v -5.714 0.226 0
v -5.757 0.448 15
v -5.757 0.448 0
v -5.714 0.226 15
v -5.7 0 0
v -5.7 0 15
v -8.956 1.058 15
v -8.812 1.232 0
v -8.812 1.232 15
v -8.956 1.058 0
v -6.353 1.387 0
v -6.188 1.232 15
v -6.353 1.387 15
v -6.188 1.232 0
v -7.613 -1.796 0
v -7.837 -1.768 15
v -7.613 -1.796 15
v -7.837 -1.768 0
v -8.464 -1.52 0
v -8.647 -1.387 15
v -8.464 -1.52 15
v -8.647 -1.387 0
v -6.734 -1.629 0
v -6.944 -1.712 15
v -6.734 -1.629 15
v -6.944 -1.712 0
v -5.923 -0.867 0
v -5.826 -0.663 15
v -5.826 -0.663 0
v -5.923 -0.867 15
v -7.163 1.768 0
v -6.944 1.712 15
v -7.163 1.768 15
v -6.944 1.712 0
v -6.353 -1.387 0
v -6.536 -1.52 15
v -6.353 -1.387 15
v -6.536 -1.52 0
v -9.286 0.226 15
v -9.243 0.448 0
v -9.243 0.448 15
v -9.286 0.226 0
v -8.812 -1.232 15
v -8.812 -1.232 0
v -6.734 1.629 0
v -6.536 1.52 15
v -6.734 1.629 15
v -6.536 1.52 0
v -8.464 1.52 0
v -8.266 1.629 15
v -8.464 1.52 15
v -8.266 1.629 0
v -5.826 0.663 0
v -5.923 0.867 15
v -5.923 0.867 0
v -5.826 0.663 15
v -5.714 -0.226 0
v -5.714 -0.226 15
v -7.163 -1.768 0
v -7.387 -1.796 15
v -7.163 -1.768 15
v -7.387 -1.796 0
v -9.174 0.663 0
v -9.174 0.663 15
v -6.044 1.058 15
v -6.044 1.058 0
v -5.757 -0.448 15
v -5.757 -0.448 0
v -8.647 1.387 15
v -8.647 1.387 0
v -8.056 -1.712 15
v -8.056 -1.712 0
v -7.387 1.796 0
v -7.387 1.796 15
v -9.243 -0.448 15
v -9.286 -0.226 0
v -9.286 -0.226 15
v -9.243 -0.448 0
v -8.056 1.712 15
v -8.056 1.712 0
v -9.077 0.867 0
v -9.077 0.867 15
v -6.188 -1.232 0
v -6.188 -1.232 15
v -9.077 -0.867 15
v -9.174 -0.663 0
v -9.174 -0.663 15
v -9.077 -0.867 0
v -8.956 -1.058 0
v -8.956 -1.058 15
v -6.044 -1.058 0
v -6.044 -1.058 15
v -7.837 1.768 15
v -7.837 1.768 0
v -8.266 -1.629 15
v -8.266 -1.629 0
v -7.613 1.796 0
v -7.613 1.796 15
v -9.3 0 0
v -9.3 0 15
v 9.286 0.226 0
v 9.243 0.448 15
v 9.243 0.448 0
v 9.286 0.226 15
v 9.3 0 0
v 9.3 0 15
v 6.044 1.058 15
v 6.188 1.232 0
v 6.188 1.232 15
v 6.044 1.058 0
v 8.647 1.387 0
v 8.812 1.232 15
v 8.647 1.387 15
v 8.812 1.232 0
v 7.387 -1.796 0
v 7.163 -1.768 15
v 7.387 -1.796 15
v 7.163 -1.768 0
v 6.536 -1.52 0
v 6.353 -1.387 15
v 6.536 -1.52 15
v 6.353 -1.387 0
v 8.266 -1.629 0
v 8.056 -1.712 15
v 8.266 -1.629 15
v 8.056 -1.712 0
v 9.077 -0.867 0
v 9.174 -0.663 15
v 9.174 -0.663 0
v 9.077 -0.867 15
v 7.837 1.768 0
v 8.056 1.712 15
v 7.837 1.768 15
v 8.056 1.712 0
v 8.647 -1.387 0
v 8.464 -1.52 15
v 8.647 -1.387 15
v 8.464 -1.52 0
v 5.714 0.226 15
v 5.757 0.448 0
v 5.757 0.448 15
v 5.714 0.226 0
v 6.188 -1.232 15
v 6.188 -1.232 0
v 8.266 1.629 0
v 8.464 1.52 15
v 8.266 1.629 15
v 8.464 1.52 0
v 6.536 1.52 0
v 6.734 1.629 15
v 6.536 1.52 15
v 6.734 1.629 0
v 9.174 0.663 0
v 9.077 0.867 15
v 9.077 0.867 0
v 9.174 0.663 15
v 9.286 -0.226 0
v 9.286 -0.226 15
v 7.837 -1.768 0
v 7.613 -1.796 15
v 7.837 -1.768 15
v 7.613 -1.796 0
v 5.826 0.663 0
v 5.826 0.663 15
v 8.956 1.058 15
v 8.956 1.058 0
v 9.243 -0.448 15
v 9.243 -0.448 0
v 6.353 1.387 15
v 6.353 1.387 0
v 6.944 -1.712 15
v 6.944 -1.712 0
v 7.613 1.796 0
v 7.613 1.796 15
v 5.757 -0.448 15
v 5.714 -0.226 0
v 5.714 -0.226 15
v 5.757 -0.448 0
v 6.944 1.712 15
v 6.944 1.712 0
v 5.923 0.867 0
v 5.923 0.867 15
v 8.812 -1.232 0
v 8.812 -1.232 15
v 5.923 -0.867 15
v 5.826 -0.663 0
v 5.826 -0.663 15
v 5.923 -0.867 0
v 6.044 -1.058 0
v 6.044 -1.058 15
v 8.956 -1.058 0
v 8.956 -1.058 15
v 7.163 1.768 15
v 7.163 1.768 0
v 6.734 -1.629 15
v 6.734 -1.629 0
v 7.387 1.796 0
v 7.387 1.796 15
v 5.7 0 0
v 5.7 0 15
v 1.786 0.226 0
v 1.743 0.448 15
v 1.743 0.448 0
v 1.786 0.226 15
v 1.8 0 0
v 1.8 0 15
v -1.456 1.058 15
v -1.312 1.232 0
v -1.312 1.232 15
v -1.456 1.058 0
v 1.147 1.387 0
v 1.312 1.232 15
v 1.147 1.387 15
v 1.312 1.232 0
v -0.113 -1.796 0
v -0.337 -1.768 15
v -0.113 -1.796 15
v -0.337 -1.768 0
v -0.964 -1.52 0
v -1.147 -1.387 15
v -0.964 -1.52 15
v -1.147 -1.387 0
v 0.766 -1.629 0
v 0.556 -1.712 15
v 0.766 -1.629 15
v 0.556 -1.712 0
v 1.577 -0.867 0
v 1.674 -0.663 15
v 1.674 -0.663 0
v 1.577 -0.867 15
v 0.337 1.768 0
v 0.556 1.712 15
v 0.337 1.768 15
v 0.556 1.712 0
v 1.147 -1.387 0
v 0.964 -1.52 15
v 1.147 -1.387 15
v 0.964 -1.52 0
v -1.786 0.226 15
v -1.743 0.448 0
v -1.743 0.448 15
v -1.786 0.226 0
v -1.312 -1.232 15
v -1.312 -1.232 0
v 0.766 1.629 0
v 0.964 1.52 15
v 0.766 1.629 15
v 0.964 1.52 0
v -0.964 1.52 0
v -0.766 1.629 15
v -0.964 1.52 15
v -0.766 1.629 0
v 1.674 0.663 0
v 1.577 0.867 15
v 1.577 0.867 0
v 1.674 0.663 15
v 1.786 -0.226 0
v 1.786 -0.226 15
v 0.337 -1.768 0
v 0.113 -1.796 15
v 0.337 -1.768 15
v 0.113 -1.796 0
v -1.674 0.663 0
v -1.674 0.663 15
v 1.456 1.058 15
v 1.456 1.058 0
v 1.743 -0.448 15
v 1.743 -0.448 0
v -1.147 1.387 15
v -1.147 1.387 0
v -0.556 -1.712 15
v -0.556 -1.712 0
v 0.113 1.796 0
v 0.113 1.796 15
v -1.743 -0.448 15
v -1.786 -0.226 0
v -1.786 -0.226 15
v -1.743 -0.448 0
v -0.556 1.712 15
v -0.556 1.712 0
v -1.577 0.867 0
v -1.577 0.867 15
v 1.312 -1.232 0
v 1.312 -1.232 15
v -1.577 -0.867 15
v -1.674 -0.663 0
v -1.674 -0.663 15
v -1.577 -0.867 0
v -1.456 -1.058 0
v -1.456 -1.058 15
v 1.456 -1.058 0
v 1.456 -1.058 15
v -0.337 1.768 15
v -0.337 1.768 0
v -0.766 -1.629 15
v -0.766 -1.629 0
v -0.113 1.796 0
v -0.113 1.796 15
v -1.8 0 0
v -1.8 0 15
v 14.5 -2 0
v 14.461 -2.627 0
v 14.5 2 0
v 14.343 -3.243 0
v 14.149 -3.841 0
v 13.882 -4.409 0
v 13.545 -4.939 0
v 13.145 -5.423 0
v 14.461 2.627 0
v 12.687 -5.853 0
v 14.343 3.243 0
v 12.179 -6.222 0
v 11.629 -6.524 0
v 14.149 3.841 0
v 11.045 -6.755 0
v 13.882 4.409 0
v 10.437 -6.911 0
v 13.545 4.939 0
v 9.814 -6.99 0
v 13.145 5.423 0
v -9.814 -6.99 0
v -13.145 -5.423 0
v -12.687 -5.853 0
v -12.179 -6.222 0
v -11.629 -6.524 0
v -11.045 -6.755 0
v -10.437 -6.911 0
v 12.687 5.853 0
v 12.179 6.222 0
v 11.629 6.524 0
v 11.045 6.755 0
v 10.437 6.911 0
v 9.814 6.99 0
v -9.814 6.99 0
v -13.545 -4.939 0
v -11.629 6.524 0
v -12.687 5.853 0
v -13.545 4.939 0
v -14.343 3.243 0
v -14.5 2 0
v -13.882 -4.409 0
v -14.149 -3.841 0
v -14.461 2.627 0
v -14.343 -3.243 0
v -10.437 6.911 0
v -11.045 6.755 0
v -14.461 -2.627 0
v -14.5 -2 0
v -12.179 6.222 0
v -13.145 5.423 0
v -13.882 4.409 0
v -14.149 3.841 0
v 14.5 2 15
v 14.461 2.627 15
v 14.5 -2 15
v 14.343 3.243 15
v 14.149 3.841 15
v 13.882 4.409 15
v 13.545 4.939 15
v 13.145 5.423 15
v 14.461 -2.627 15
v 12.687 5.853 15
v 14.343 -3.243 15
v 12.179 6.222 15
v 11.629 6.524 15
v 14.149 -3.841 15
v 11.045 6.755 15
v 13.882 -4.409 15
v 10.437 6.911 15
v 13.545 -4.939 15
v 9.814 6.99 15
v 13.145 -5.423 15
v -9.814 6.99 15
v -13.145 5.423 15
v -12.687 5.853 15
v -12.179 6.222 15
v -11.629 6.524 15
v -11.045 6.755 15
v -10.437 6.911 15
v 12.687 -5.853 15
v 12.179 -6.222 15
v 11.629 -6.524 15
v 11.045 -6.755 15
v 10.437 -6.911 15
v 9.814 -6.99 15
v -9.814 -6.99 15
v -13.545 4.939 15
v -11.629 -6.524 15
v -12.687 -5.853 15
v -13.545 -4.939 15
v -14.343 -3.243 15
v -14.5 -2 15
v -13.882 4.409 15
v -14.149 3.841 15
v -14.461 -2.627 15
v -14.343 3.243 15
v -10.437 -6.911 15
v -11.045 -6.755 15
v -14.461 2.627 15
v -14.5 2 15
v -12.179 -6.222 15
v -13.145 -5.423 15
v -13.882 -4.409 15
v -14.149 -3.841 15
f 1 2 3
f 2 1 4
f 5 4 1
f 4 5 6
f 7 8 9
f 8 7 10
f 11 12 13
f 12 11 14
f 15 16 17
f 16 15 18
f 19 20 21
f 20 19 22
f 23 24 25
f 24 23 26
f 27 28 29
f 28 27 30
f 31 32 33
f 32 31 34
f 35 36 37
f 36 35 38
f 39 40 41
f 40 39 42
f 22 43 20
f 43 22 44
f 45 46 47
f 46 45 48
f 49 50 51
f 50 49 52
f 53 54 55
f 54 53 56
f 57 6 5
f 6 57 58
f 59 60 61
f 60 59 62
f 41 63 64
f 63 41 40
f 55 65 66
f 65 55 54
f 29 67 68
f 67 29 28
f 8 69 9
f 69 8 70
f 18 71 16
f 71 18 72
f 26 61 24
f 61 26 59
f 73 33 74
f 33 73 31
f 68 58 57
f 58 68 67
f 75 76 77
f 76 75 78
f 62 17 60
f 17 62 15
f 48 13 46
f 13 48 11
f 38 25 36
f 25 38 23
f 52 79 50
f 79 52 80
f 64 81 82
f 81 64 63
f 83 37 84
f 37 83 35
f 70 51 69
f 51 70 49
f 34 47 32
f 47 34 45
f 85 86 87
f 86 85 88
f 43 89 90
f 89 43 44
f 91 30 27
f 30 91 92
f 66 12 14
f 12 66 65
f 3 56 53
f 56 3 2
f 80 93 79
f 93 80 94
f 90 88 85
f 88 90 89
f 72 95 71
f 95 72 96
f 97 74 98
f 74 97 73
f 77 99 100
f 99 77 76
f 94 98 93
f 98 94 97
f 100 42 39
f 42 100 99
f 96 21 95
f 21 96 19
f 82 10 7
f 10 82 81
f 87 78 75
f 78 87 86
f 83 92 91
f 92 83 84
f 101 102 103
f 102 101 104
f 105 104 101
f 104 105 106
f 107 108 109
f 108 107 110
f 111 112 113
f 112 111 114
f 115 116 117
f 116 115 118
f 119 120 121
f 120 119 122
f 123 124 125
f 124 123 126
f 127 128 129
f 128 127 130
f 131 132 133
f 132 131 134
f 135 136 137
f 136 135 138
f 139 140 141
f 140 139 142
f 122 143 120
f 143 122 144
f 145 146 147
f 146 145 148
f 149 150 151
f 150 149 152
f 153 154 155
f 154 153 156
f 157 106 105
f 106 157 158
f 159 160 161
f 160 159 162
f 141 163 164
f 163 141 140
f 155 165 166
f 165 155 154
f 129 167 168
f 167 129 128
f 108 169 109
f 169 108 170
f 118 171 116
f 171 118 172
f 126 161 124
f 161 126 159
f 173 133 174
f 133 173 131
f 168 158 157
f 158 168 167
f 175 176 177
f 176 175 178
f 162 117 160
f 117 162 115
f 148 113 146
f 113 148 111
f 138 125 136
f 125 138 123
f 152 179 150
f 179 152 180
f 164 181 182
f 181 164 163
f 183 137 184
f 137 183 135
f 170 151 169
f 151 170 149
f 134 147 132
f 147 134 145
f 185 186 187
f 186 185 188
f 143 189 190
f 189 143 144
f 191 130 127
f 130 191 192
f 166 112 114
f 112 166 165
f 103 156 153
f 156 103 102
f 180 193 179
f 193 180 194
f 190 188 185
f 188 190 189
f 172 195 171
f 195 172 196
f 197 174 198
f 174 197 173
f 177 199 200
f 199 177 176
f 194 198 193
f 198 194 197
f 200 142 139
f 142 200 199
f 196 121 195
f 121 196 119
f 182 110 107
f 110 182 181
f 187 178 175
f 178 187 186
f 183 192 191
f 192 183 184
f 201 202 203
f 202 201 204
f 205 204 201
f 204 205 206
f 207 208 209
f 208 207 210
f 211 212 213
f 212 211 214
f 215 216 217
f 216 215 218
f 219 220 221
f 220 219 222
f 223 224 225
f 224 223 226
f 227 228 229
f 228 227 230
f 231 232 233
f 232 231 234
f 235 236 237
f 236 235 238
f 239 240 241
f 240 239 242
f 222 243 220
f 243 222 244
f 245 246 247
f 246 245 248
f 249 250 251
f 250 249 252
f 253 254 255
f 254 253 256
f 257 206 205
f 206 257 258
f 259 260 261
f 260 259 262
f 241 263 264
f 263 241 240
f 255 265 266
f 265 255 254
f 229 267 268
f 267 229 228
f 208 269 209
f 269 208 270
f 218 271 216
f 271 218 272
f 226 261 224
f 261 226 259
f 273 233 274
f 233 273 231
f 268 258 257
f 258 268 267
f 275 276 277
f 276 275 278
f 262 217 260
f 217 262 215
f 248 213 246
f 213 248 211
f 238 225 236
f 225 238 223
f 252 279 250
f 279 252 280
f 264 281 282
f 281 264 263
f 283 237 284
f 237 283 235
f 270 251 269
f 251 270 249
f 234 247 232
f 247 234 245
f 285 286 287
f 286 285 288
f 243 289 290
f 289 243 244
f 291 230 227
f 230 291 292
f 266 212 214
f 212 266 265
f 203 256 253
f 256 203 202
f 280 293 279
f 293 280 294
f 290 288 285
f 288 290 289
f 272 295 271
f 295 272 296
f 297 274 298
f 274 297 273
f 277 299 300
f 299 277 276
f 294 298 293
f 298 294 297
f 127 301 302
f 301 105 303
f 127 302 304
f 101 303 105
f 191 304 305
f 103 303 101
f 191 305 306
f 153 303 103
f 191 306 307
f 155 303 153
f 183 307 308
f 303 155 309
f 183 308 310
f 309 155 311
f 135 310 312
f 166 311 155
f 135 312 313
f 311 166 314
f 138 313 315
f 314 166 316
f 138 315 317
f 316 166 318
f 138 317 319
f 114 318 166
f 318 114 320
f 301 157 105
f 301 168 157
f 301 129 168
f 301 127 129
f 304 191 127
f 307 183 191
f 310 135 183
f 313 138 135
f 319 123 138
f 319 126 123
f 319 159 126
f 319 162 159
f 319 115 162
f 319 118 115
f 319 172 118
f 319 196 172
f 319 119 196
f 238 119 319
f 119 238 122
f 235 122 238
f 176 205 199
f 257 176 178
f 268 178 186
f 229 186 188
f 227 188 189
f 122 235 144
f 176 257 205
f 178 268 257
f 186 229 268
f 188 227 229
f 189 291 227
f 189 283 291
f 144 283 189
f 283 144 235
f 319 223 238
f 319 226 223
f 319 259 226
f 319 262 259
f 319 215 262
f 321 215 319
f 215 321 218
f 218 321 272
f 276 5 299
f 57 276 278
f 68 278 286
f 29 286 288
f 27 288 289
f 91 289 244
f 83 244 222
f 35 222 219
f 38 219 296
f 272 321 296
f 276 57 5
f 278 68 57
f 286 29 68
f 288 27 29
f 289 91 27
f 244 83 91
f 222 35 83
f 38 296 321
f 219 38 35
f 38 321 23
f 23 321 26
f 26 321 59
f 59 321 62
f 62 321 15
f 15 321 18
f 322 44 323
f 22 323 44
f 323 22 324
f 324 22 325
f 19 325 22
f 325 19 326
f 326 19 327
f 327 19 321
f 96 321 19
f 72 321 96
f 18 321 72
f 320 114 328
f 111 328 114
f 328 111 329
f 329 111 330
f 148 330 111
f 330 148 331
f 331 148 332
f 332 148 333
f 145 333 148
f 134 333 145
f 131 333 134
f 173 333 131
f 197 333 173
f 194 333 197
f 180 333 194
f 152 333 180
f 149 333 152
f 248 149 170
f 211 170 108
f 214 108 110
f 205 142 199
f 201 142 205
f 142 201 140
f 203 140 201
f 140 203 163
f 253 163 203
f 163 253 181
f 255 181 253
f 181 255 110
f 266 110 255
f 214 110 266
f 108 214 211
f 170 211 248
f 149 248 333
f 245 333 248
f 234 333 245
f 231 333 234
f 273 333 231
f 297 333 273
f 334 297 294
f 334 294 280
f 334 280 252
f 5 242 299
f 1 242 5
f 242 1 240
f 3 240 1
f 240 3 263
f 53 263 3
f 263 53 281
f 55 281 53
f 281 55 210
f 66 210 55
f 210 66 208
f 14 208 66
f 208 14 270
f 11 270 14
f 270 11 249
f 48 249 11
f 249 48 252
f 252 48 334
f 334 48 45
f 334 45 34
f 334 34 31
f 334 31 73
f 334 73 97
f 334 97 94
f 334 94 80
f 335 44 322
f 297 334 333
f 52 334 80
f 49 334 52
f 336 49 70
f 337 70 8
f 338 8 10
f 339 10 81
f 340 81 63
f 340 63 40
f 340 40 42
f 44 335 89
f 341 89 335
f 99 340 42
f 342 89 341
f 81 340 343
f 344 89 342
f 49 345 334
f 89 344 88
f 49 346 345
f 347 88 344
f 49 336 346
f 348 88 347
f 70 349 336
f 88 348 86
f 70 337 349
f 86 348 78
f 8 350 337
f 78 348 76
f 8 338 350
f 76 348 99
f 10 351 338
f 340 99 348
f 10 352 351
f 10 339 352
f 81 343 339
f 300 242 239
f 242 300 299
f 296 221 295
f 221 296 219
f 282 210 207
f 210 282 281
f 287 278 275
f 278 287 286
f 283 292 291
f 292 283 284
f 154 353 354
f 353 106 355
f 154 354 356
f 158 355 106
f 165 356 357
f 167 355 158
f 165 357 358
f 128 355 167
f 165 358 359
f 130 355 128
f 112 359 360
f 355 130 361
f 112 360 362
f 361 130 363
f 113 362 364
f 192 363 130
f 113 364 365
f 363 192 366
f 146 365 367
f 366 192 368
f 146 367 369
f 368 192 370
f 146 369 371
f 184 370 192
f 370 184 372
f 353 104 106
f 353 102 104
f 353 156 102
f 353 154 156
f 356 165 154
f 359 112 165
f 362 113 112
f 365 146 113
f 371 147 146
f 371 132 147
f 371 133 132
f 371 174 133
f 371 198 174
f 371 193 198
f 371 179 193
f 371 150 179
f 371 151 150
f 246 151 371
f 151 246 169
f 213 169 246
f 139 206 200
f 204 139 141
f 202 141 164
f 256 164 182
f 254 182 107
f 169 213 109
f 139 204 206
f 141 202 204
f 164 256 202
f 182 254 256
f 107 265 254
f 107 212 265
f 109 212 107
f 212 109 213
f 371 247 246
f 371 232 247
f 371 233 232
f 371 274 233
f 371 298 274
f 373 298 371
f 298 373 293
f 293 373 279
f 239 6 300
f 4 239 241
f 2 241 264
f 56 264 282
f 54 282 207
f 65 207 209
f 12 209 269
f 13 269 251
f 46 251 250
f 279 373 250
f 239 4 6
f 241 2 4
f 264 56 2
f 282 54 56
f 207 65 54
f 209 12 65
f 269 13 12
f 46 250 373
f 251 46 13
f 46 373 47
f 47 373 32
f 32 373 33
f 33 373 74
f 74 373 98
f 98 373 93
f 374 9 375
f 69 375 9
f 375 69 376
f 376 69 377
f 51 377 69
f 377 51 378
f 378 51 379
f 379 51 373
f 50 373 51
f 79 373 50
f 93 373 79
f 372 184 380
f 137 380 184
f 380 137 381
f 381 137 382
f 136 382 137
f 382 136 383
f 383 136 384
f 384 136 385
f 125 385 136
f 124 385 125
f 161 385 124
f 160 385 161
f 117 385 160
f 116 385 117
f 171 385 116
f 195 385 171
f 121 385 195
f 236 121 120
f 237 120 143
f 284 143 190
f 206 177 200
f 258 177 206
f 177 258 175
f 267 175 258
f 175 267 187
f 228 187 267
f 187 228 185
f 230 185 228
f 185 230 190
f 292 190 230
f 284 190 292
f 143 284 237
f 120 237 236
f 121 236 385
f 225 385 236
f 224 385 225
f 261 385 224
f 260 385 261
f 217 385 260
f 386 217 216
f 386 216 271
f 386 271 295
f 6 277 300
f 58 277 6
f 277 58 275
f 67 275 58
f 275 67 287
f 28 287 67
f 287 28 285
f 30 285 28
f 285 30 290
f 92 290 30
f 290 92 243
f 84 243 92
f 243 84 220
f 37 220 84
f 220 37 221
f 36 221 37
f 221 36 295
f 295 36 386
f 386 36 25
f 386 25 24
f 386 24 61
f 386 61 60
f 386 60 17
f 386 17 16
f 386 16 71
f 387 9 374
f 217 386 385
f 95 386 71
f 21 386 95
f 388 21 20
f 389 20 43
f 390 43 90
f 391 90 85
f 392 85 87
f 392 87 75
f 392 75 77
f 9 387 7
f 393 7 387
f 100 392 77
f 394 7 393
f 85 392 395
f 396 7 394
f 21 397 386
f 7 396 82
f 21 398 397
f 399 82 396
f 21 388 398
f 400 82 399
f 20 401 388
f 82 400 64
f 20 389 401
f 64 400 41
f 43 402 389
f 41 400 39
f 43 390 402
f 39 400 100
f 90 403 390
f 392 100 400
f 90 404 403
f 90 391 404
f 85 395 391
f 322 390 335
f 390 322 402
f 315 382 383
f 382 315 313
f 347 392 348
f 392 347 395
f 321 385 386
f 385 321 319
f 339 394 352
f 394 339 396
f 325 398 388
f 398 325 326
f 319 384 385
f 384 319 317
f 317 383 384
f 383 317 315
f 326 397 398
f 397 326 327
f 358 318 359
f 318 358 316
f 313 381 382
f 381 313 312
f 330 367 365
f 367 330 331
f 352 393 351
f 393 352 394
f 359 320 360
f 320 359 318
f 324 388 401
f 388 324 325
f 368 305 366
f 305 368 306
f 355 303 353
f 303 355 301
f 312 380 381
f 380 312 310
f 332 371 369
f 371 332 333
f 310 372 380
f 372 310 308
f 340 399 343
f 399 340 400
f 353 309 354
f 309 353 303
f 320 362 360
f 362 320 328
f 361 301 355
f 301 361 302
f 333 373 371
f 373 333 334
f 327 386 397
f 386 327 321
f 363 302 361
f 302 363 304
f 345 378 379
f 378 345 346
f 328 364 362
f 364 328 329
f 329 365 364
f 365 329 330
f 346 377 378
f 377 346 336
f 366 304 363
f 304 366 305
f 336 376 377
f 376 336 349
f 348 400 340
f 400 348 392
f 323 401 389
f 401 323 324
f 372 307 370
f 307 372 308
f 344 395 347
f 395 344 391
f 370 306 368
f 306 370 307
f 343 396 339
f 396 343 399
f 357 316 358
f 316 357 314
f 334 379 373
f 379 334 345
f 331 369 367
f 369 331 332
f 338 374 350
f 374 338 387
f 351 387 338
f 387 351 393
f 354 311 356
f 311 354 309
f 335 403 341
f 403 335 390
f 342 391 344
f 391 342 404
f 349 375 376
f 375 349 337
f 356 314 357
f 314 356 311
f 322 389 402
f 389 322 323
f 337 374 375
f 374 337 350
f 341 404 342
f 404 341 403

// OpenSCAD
$fn = 50;


difference() {
	union() {
		hull() {
			translate(v = [-9.5000000000, 2.0000000000, 0]) {
				cylinder(h = 15, r = 5);
			}
			translate(v = [9.5000000000, 2.0000000000, 0]) {
				cylinder(h = 15, r = 5);
			}
			translate(v = [-9.5000000000, -2.0000000000, 0]) {
				cylinder(h = 15, r = 5);
			}
			translate(v = [9.5000000000, -2.0000000000, 0]) {
				cylinder(h = 15, r = 5);
			}
		}
	}
	union() {
		translate(v = [-7.5000000000, 0.0000000000, -100.0000000000]) {
			cylinder(h = 200, r = 1.8000000000);
		}
		translate(v = [7.5000000000, 0.0000000000, -100.0000000000]) {
			cylinder(h = 200, r = 1.8000000000);
		}
		translate(v = [-7.5000000000, 0.0000000000, 0]) {
			cylinder(h = 15, r = 1.8000000000);
		}
		cylinder(h = 15, r = 1.8000000000);
		translate(v = [7.5000000000, 0.0000000000, 0]) {
			cylinder(h = 15, r = 1.8000000000);
		}
		translate(v = [-7.5000000000, 0.0000000000, 0]) {
			cylinder(h = 15, r = 1.8000000000);
		}
		cylinder(h = 15, r = 1.8000000000);
		translate(v = [7.5000000000, 0.0000000000, 0]) {
			cylinder(h = 15, r = 1.8000000000);
		}
		translate(v = [-7.5000000000, 0.0000000000, 0]) {
			cylinder(h = 15, r = 1.8000000000);
		}
		cylinder(h = 15, r = 1.8000000000);
		translate(v = [7.5000000000, 0.0000000000, 0]) {
			cylinder(h = 15, r = 1.8000000000);
		}
	}
}
